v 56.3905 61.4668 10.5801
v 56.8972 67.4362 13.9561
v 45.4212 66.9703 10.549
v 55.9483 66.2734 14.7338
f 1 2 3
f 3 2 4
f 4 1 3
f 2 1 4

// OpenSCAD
// Auto-generated auxetic polyhedron
points = [
    [45.421230, 66.970320, 10.549018],
    [56.897165, 67.436189, 13.956108],
    [56.390511, 61.466797, 10.580116],
    [55.948334, 66.273439, 14.733763],
];

faces = [
    [0, 1, 2],
    [3, 1, 0],
    [0, 2, 3],
    [3, 2, 1],
];

polyhedron(points = points, faces = faces);
